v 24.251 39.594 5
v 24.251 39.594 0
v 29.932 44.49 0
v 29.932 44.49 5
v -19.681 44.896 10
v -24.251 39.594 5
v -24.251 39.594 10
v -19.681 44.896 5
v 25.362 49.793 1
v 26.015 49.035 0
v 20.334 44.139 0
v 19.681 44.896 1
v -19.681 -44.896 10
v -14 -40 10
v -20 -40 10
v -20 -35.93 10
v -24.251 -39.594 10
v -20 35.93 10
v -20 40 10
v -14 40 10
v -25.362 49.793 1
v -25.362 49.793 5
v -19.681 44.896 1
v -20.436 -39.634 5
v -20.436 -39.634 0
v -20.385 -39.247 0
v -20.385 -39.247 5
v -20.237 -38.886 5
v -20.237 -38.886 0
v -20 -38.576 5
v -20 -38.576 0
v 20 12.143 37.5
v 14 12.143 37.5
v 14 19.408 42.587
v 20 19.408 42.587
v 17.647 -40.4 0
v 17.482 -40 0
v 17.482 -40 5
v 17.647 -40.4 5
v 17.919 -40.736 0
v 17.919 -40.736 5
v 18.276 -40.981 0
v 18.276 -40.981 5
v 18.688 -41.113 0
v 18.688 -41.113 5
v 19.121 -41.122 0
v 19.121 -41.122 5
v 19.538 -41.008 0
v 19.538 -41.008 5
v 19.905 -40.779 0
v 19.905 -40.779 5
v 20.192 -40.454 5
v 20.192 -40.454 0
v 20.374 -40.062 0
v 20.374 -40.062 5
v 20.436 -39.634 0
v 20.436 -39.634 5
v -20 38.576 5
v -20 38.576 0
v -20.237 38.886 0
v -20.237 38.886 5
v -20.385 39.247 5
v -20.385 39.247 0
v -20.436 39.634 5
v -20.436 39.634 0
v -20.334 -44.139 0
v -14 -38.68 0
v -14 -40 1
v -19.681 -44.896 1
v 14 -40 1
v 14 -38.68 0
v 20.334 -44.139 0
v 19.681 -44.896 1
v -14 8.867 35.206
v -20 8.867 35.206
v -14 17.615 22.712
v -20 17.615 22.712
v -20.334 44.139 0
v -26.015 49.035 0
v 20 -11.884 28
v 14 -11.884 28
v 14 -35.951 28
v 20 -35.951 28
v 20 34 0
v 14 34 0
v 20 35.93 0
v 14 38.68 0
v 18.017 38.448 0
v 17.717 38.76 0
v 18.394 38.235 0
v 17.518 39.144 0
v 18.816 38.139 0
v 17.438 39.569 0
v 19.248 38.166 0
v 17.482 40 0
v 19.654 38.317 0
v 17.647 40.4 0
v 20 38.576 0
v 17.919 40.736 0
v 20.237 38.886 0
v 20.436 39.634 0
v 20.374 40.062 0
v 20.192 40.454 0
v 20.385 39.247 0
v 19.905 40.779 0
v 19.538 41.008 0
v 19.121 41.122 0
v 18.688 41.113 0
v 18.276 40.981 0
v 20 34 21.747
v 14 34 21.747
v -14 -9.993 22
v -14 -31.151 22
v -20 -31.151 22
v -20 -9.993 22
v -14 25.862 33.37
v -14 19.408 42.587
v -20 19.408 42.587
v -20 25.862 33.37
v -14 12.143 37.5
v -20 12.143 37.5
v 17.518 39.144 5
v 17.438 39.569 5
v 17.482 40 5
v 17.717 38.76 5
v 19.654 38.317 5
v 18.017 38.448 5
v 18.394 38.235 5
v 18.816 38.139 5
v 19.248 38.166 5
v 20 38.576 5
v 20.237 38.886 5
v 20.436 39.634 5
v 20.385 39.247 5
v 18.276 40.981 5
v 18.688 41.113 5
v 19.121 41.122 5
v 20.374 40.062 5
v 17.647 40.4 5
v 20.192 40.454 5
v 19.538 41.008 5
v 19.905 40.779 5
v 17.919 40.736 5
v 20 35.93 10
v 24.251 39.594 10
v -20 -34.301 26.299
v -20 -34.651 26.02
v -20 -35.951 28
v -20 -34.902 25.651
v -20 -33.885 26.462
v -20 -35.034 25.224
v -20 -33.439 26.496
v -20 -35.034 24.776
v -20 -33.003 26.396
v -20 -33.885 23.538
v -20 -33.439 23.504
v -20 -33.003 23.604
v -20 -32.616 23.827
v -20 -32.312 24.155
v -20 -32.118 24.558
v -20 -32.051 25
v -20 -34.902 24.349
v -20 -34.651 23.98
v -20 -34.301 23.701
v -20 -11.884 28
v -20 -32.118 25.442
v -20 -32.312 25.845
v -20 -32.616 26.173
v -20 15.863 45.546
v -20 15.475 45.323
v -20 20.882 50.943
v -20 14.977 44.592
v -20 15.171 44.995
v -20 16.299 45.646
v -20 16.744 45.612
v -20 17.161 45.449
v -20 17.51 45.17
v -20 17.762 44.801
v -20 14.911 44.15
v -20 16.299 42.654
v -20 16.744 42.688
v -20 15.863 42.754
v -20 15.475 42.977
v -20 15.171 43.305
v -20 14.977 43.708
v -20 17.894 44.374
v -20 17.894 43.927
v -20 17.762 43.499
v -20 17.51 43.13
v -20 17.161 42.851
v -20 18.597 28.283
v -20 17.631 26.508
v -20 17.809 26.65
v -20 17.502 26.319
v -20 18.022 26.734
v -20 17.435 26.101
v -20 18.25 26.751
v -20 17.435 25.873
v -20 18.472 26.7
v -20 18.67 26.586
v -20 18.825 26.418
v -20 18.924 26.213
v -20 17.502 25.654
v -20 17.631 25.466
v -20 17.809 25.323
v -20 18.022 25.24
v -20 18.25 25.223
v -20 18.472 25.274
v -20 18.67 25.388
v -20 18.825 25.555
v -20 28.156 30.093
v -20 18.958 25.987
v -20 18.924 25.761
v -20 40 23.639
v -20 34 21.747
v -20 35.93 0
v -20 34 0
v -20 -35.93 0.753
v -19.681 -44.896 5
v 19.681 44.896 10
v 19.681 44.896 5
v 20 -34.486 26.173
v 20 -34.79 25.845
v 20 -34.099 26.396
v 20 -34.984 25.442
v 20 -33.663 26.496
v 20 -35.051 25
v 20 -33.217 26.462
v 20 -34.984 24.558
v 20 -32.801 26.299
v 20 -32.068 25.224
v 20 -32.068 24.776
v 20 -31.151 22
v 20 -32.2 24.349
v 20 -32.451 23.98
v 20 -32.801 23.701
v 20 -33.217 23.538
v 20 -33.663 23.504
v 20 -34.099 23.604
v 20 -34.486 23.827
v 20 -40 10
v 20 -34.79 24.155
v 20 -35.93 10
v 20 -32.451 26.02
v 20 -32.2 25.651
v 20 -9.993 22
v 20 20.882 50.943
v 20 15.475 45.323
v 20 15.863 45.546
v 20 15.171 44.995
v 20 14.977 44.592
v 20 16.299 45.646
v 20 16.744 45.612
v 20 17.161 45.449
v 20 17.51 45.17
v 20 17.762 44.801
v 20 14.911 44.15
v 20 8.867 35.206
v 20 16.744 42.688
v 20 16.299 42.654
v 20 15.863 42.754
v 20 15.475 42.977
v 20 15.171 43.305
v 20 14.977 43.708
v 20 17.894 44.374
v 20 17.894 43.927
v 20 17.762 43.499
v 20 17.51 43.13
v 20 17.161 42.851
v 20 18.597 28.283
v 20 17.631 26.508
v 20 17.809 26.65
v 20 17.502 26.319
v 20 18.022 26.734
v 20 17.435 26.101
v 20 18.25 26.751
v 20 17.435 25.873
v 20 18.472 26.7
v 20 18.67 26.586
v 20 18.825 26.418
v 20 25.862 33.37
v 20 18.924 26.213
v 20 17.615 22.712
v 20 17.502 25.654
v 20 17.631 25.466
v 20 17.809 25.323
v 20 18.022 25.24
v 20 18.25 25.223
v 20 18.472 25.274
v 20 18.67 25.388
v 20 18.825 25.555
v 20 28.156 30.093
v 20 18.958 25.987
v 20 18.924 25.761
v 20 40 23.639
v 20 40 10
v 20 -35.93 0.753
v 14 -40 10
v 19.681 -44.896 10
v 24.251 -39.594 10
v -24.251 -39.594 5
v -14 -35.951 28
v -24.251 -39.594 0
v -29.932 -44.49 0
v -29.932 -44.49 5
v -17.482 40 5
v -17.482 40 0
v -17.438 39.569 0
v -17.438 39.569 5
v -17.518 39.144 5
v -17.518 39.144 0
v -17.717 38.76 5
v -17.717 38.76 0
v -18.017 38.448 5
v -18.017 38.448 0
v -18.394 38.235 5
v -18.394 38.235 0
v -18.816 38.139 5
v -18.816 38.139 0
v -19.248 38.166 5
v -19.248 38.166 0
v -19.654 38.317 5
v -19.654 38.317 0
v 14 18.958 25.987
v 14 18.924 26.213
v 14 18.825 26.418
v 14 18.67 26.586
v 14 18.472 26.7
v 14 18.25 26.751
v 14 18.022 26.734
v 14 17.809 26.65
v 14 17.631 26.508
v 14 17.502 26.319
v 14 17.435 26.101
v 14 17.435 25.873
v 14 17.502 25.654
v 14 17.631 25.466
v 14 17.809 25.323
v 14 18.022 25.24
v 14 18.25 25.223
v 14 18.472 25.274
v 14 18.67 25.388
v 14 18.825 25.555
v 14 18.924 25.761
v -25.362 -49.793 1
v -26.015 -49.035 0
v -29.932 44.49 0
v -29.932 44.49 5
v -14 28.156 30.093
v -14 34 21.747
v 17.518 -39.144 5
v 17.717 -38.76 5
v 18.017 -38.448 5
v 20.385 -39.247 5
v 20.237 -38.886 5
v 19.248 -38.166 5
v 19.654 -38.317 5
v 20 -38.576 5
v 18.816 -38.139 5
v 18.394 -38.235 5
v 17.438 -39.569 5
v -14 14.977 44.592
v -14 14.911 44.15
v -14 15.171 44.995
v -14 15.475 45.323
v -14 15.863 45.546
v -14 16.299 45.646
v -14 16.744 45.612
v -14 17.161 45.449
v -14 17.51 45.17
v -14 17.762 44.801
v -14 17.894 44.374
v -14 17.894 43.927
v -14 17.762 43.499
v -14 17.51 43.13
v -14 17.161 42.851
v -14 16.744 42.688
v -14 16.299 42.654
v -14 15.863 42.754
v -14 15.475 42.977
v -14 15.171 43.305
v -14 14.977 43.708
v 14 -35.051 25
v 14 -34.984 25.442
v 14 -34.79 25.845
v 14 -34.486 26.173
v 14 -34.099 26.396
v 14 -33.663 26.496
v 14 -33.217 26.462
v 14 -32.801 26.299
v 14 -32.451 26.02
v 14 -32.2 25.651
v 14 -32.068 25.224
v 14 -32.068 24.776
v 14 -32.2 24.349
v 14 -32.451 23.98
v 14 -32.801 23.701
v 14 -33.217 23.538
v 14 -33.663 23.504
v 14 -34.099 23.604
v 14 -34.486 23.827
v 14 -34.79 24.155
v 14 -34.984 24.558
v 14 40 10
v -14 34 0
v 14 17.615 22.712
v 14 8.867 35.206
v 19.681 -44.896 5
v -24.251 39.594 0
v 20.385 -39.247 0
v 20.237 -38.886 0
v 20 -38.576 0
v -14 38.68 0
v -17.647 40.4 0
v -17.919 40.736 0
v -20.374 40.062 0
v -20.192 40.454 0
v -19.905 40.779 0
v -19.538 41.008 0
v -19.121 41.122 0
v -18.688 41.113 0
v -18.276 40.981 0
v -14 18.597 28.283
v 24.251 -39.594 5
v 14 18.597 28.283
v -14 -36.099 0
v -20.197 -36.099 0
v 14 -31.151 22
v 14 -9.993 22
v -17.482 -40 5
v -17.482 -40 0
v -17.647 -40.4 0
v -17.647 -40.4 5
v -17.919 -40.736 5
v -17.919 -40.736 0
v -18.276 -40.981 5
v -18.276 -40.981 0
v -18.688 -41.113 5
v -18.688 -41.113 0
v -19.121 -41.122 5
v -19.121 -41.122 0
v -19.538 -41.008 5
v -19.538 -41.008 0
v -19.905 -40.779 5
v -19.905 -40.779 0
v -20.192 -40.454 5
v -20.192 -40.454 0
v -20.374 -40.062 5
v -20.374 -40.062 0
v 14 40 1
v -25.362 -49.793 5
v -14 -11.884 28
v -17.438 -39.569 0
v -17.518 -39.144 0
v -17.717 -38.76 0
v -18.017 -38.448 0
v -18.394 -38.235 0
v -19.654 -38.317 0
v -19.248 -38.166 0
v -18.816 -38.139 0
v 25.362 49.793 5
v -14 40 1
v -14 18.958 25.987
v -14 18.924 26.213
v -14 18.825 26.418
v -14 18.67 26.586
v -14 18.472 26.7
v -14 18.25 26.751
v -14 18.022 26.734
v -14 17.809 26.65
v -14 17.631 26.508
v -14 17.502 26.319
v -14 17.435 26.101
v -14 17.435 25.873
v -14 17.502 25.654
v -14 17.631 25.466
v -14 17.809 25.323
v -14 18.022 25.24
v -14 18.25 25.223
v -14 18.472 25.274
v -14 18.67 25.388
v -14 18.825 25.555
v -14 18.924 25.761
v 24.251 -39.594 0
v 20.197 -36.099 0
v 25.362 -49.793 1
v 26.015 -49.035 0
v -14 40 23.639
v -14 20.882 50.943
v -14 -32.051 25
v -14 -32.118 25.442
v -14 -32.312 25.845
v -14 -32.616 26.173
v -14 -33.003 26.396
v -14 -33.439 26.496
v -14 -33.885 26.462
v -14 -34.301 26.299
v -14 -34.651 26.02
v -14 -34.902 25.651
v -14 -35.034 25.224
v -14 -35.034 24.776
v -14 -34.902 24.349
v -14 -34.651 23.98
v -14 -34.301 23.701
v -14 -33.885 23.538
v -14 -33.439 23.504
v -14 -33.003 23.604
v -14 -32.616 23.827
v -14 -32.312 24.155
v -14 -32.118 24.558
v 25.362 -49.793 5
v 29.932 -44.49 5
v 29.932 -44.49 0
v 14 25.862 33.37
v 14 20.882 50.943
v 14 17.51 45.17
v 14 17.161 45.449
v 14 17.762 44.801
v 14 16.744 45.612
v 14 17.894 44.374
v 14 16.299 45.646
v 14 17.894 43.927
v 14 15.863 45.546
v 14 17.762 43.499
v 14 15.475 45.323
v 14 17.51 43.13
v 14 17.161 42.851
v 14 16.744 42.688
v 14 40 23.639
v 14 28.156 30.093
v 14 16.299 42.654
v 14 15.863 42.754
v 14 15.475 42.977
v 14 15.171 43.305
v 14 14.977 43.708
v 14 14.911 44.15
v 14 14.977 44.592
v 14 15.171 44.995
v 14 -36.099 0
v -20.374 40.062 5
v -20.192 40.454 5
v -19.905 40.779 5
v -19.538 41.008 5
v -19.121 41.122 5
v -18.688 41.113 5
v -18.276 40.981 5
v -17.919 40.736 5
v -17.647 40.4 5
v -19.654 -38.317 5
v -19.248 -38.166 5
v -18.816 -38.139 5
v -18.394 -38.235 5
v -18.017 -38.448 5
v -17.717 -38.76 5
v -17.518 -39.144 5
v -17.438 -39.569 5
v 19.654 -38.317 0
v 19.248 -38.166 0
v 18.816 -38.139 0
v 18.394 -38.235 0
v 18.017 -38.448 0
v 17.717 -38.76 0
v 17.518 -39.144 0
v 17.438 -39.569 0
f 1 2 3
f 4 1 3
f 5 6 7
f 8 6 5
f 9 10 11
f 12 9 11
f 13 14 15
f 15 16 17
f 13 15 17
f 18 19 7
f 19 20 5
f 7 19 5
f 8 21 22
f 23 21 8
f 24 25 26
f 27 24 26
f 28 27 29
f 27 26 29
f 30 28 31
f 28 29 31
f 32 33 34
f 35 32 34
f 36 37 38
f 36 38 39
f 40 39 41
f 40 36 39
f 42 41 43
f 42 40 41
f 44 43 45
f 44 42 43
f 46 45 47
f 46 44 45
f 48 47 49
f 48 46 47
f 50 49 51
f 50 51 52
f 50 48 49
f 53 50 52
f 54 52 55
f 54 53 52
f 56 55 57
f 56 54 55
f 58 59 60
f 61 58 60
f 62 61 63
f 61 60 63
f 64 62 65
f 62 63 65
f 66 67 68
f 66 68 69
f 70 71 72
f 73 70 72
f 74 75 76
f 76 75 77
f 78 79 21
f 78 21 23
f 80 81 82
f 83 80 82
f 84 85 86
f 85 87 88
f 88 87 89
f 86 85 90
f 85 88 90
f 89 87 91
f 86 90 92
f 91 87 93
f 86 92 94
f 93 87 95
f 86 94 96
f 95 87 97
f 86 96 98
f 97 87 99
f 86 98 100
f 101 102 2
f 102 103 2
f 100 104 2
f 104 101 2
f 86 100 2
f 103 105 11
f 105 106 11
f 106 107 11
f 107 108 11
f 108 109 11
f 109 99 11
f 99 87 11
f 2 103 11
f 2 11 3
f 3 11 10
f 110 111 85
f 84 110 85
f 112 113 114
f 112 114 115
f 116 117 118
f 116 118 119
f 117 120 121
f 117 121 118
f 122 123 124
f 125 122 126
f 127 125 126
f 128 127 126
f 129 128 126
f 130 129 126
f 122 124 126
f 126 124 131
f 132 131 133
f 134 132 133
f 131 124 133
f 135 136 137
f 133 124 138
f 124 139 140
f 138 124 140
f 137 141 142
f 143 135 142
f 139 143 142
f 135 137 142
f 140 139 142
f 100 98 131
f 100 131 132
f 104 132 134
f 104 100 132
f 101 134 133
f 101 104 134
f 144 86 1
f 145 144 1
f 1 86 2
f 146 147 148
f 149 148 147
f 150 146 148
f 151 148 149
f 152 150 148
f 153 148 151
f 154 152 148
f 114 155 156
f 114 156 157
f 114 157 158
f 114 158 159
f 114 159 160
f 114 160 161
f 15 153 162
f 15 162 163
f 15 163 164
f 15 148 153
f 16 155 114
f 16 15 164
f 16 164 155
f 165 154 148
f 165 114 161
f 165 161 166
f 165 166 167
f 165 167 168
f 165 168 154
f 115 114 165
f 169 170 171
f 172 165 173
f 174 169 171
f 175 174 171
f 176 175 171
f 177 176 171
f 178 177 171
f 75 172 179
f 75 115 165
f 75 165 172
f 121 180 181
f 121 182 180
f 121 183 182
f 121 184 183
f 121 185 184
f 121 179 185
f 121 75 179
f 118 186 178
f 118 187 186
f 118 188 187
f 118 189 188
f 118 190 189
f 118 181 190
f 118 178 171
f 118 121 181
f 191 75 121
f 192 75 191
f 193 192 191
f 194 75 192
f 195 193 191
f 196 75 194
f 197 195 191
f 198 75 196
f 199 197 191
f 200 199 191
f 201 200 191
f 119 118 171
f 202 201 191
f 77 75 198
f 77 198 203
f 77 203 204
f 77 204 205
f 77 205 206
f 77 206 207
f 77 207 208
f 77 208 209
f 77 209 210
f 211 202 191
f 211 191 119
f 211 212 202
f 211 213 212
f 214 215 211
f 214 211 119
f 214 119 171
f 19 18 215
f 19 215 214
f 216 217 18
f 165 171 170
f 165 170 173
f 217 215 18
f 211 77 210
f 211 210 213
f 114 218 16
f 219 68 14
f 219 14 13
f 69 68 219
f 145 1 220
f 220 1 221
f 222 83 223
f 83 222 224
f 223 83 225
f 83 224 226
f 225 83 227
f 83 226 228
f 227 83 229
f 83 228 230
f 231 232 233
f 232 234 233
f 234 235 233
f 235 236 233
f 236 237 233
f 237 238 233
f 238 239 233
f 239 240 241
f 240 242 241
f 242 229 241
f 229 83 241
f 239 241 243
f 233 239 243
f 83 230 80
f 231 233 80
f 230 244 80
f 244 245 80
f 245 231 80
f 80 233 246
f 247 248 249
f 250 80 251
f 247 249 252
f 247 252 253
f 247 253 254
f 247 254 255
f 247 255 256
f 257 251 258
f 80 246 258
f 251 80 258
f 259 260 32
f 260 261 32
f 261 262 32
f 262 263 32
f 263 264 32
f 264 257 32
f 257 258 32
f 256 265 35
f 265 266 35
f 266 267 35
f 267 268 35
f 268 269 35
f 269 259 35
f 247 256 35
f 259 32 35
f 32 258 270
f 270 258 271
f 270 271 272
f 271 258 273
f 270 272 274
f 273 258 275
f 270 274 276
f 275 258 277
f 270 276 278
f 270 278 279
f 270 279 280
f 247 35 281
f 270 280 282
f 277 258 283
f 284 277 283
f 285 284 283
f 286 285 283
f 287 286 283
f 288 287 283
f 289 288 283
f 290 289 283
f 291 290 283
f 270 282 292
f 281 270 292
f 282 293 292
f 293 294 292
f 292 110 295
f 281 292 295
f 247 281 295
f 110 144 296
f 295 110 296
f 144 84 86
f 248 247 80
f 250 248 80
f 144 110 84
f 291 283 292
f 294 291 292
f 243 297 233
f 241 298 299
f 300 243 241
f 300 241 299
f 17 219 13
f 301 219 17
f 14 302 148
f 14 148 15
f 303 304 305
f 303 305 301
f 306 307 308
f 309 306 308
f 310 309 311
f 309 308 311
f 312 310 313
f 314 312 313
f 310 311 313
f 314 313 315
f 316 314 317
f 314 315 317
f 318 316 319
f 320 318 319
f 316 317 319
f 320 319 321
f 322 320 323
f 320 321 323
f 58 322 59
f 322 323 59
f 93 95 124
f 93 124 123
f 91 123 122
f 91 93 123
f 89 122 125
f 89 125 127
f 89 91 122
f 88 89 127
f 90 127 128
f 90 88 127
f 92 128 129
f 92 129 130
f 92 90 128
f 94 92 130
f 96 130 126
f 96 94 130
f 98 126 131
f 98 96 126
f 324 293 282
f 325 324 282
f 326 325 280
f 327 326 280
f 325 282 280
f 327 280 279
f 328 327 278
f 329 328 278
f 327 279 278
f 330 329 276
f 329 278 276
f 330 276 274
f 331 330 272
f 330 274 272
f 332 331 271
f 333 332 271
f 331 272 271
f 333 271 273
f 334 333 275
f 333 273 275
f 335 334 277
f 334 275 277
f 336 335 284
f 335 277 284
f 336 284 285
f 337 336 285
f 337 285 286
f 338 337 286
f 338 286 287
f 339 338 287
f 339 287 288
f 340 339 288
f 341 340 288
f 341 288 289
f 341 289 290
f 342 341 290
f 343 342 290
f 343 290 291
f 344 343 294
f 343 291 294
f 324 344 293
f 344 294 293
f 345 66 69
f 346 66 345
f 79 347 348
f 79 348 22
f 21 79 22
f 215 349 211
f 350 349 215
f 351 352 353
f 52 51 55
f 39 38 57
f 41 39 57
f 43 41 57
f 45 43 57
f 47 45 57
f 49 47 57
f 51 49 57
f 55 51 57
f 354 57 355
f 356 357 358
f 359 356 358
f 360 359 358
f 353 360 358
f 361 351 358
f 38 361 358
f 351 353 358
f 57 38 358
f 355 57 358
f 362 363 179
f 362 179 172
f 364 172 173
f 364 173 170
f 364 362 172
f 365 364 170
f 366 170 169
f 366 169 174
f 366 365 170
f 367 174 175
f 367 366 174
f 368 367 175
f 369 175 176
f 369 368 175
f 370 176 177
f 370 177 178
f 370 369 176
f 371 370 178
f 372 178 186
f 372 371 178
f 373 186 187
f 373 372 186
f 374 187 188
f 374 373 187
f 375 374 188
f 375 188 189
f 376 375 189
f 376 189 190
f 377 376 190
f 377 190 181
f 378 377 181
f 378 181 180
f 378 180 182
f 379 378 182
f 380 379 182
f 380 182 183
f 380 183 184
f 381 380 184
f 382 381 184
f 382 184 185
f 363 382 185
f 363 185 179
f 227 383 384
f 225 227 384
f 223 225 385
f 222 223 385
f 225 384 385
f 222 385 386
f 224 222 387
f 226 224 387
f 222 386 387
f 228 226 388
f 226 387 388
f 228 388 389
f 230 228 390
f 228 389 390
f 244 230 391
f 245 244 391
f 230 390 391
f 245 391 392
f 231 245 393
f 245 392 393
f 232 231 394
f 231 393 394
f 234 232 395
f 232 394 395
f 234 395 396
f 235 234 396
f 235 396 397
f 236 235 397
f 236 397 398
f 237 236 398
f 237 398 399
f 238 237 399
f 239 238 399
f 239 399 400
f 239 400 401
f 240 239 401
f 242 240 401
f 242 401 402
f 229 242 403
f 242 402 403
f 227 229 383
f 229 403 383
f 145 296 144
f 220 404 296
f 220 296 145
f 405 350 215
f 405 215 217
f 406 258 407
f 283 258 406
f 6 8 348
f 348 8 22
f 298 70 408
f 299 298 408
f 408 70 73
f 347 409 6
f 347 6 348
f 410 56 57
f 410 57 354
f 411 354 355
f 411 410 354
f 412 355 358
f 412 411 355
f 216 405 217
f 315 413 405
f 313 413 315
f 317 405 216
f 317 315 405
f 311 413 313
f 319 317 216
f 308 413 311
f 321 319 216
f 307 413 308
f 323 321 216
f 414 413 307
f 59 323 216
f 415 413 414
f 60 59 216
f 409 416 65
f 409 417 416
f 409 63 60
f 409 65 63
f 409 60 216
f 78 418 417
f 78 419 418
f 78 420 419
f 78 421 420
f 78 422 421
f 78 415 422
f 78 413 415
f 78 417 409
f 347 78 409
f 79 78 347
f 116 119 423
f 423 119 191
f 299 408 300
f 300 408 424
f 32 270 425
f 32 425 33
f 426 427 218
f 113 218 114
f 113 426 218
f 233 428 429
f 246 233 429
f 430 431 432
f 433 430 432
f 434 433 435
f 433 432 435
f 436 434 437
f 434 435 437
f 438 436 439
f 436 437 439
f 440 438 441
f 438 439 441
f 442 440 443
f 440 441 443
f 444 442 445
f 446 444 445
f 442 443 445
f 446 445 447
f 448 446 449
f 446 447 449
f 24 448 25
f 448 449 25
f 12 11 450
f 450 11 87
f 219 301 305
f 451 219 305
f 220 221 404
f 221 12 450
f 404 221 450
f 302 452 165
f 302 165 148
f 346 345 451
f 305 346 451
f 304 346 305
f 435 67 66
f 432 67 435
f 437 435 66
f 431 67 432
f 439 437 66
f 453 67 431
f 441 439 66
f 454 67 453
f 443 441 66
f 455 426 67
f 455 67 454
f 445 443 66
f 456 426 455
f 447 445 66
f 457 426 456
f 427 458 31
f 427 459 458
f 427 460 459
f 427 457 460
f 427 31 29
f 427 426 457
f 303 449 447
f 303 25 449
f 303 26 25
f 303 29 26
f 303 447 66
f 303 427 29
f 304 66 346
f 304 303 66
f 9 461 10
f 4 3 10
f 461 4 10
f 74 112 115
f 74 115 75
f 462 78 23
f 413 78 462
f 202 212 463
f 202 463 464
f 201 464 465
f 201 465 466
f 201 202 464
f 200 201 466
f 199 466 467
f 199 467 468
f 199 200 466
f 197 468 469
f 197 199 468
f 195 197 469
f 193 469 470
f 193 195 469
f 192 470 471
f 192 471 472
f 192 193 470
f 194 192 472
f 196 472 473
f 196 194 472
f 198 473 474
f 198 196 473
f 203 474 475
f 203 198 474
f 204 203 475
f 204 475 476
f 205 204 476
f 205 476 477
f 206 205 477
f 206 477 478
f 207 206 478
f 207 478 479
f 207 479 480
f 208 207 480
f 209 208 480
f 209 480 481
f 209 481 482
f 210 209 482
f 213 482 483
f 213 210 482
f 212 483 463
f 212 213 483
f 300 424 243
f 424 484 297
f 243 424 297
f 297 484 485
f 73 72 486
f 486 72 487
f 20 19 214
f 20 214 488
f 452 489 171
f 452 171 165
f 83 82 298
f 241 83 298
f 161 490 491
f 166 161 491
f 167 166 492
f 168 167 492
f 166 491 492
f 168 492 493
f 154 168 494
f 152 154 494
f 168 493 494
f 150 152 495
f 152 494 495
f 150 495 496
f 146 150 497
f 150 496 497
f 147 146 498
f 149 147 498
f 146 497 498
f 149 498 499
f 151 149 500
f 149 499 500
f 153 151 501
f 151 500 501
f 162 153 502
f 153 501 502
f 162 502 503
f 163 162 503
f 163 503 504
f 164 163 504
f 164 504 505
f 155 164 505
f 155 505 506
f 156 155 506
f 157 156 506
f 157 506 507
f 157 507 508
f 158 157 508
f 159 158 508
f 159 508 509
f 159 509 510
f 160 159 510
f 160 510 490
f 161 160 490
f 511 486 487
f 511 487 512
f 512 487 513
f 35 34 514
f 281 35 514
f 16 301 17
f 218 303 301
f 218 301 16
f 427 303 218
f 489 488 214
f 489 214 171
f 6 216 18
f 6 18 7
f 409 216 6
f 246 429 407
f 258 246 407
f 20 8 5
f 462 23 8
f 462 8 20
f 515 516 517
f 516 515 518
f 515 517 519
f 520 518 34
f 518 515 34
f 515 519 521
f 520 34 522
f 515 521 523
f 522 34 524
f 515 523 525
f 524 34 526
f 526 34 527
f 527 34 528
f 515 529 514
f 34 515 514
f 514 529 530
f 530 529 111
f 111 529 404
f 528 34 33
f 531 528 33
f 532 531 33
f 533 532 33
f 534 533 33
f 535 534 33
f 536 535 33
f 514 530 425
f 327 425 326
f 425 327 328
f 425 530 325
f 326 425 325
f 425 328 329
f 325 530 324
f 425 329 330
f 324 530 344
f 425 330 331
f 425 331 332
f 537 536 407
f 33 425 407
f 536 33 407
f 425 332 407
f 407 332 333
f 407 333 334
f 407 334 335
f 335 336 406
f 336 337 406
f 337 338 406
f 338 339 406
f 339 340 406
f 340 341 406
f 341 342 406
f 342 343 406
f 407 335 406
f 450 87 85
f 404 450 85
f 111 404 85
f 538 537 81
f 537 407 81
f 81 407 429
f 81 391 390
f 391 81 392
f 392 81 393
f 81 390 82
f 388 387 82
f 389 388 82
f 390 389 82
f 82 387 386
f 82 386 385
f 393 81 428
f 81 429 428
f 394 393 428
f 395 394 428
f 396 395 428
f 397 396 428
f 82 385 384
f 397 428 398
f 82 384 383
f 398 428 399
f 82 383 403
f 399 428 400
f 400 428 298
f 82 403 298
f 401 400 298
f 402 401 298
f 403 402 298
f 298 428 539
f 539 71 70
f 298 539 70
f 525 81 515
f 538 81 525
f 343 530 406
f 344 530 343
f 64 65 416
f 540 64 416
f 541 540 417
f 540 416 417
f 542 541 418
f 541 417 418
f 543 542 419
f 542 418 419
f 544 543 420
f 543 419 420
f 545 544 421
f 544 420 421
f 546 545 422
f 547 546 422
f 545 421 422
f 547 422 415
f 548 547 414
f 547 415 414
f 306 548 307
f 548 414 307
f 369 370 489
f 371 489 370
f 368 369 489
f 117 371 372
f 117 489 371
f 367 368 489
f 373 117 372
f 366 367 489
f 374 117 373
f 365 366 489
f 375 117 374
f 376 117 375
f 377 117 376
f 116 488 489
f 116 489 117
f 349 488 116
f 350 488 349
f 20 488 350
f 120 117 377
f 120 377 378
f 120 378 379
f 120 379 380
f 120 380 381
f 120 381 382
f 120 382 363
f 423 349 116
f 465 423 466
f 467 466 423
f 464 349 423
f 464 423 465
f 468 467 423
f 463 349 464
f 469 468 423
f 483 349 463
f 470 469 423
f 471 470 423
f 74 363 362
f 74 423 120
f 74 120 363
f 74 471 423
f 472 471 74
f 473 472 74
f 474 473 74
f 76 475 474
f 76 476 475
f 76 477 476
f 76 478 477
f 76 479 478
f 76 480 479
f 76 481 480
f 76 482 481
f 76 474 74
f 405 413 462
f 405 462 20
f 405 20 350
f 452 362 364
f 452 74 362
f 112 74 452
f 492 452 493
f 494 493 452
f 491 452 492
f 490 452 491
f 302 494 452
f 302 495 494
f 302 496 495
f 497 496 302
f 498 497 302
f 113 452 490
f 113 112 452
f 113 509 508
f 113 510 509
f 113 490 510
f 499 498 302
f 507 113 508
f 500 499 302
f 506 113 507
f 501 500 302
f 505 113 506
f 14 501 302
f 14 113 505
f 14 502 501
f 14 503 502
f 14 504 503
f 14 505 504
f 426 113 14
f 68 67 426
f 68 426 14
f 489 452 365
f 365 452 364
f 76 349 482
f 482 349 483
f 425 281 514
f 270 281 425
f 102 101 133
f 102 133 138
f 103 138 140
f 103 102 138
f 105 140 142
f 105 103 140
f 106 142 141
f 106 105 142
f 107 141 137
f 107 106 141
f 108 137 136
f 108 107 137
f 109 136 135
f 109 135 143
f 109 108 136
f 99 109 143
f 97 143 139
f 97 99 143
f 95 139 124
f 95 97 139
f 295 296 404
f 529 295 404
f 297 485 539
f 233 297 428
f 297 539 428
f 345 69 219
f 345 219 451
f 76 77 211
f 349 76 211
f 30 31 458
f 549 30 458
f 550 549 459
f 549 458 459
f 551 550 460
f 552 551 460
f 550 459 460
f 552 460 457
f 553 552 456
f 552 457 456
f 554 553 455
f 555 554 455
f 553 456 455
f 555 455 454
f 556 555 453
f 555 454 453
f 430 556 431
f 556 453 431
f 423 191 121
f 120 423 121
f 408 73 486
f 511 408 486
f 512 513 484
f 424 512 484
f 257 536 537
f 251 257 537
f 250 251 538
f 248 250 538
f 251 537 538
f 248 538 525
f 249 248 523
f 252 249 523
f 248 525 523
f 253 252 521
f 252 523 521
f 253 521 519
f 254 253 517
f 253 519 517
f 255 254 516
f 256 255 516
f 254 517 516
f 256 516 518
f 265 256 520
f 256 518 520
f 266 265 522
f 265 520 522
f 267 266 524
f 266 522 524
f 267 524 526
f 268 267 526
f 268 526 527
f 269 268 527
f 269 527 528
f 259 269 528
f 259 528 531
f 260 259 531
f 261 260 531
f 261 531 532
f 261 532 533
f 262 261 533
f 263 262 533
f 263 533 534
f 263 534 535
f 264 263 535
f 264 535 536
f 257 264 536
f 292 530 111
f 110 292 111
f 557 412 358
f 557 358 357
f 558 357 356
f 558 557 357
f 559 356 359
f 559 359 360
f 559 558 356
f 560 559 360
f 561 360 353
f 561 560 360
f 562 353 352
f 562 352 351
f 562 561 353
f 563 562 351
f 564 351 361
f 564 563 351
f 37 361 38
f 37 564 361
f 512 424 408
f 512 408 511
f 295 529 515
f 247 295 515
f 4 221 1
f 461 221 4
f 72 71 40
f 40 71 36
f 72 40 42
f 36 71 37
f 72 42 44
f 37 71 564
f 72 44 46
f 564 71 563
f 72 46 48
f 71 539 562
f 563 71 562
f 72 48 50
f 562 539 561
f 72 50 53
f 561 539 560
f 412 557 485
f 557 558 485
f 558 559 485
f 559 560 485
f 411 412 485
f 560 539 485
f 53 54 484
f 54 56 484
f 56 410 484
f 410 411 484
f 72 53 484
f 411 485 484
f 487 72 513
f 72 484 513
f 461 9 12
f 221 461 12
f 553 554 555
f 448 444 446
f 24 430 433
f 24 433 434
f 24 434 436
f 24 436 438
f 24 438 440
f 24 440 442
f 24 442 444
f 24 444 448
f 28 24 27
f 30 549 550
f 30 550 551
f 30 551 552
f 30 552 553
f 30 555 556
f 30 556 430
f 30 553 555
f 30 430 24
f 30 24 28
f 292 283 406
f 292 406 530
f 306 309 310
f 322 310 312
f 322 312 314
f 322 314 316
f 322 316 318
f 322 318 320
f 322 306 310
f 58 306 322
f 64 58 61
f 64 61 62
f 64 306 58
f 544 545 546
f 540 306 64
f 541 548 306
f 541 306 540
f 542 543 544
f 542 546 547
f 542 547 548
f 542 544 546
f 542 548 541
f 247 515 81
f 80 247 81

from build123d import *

# Parameters (mm, degrees)
F1_DEPTH   = 70
F2_DEPTH   = 10
F3_DEPTH   = 5
F5_DEPTH   = 25
F6_DEPTH   = 5
F8_R       = 0.7661349595
F9_DEPTH   = 6
F7_R       = 1.5
F10_DEPTH  = 7
F13_DEPTH  = 6
F14_R      = 1.5
F15_DEPTH  = 12
F16_SIZE   = 1
F16_2_SIZE = 1


with BuildPart() as f1:
    # F0 (on Top) → F1 (new body)
    with BuildSketch(Plane.XY):
        with BuildLine():
            Line((17.481584177, 40), (14, 40))
            Line((14, 40), (18.5698965916, 34.6975434805))
            Line((18.5698965916, 34.6975434805), (20, 35.9300712093))
            Line((20, 35.9300712093), (20, 38.5762325992))
            ThreePointArc((20, 38.5762325992), (18.1979669018, 38.327945742), (17.481584177, 40))
        make_face()
        with BuildLine():
            Line((20, 40), (17.481584177, 40))
            ThreePointArc((17.481584177, 40), (18.1979669018, 38.327945742), (20, 38.5762325992))
            Line((20, 38.5762325992), (20, 40))
        make_face()
        Polygon((18.5698965916, 34.6975434805), (14, 40), (14, 0), (14, -40), (18.5698965916, -34.6975434805), (20, -35.9300712093), (20, 0), (20, 35.9300712093), align=None)
        with BuildLine():
            Line((18.5698965916, -34.6975434805), (14, -40))
            Line((14, -40), (17.481584177, -40))
            ThreePointArc((17.481584177, -40), (18.1979669018, -38.327945742), (20, -38.5762325992))
            Line((20, -38.5762325992), (20, -35.9300712093))
            Line((20, -35.9300712093), (18.5698965916, -34.6975434805))
        make_face()
        with BuildLine():
            ThreePointArc((20, -38.5762325992), (18.1979669018, -38.327945742), (17.481584177, -40))
            Line((17.481584177, -40), (20, -40))
            Line((20, -40), (20, -38.5762325992))
        make_face()
    extrude(amount=F1_DEPTH)

    # F0 (on Top) → F2 (join)
    with BuildSketch(Plane.XY):
        with BuildLine():
            ThreePointArc((20.4361765556, 39.633720036), (19.1207184642, 41.1223248473), (17.481584177, 40))
            Line((17.481584177, 40), (20, 40))
            Line((20, 40), (20, 38.5762325992))
            ThreePointArc((20, 38.5762325992), (20.3228515656, 39.0617651281), (20.4361765556, 39.633720036))
        make_face()
        with BuildLine():
            Line((19.6812034138, 44.8963177768), (14, 40))
            Line((14, 40), (17.481584177, 40))
            ThreePointArc((17.481584177, 40), (19.1207184642, 41.1223248473), (20.4361765556, 39.633720036))
            ThreePointArc((20.4361765556, 39.633720036), (20.3228515656, 39.0617651281), (20, 38.5762325992))
            Line((20, 38.5762325992), (20, 35.9300712093))
            Line((20, 35.9300712093), (24.2511000054, 39.5938612572))
            Line((24.2511000054, 39.5938612572), (19.6812034138, 44.8963177768))
        make_face()
        with BuildLine():
            Line((17.481584177, -40), (14, -40))
            Line((14, -40), (19.6812034138, -44.8963177768))
            Line((19.6812034138, -44.8963177768), (24.2511000054, -39.5938612572))
            Line((24.2511000054, -39.5938612572), (20, -35.9300712093))
            Line((20, -35.9300712093), (20, -38.5762325992))
            ThreePointArc((20, -38.5762325992), (20.3228515656, -39.0617651281), (20.4361765556, -39.633720036))
            ThreePointArc((20.4361765556, -39.633720036), (19.1207184642, -41.1223248473), (17.481584177, -40))
        make_face()
        with BuildLine():
            Line((20, -40), (17.481584177, -40))
            ThreePointArc((17.481584177, -40), (19.1207184642, -41.1223248473), (20.4361765556, -39.633720036))
            ThreePointArc((20.4361765556, -39.633720036), (20.3228515656, -39.0617651281), (20, -38.5762325992))
            Line((20, -38.5762325992), (20, -40))
        make_face()
    extrude(amount=F2_DEPTH)

    # F0 (on Top) → F3 (join)
    with BuildSketch(Plane.XY):
        Polygon((25.3624068276, 49.7926355535), (19.6812034138, 44.8963177768), (24.2511000054, 39.5938612572), (29.9323034192, 44.490179034), align=None)
        Polygon((24.2511000054, -39.5938612572), (19.6812034138, -44.8963177768), (25.3624068276, -49.7926355535), (29.9323034192, -44.490179034), align=None)
    extrude(amount=F3_DEPTH)

    # F4 (on face) → F5 (cut)
    with BuildSketch(Plane(origin=(14, 0, 0), x_dir=(0, -1, 0), z_dir=(-1, 0, 0))):
        Polygon((-34, 0), (36.0994255375, 0), (31.1508810268, 22), (9.992649815, 22), (-19.4081855757, 42.5866865702), (-34, 21.7474158853), align=None)
        Polygon((-20.8816392233, 50.943057454), (11.8844425483, 28), (35.9511908549, 28), (40, 10), (40, 70), (-40, 70), (-40, 23.6392086186), align=None)
    extrude(amount=-F5_DEPTH, mode=Mode.SUBTRACT)

    # F0 (on Top) → F6 (cut)
    with BuildSketch(Plane.XY):
        with BuildLine():
            Line((20, -40), (17.481584177, -40))
            ThreePointArc((17.481584177, -40), (19.1207184642, -41.1223248473), (20.4361765556, -39.633720036))
            ThreePointArc((20.4361765556, -39.633720036), (20.3228515656, -39.0617651281), (20, -38.5762325992))
            Line((20, -38.5762325992), (20, -40))
        make_face()
        with BuildLine():
            ThreePointArc((20, -38.5762325992), (18.1979669018, -38.327945742), (17.481584177, -40))
            Line((17.481584177, -40), (20, -40))
            Line((20, -40), (20, -38.5762325992))
        make_face()
        with BuildLine():
            ThreePointArc((20.4361765556, 39.633720036), (19.1207184642, 41.1223248473), (17.481584177, 40))
            Line((17.481584177, 40), (20, 40))
            Line((20, 40), (20, 38.5762325992))
            ThreePointArc((20, 38.5762325992), (20.3228515656, 39.0617651281), (20.4361765556, 39.633720036))
        make_face()
        with BuildLine():
            Line((20, 40), (17.481584177, 40))
            ThreePointArc((17.481584177, 40), (18.1979669018, 38.327945742), (20, 38.5762325992))
            Line((20, 38.5762325992), (20, 40))
        make_face()
    extrude(amount=F6_DEPTH, mode=Mode.SUBTRACT)

    # F7 (on face) → F10 (cut)
    with BuildSketch(Plane(origin=(14, 0, 0), x_dir=(0, -1, 0), z_dir=(-1, 0, 0))):
        with Locations((-16.4106077752, 44.1500837642)):
            Circle(F7_R)
    extrude(amount=-F10_DEPTH, mode=Mode.SUBTRACT)


with BuildPart() as f9:
    # F8 (on face) → F9 (new body)
    with BuildSketch(Plane.YZ.offset(20)):
        Polygon((12.143454066, 37.499866804), (8.8668458888, 35.2055610586), (17.6148869053, 22.7120637181), (28.1562265921, 30.0931892296), (25.8619208467, 33.3697974068), (18.597189337, 28.2829776406), align=None)
        with Locations((18.1923007229, 25.9867402042)):
            Circle(F8_R, mode=Mode.SUBTRACT)
    extrude(amount=-F9_DEPTH)

    # F11: union F1
    add(f1.part)


with BuildPart() as f12_1:
    # F12: instance of F9
    add(f9.part.mirror(Plane.YZ))

    # F14 (on face) → F15 (cut)
    with BuildSketch(Plane.YZ.offset(-14)):
        with Locations((-33.5510359408, 25)):
            Circle(F14_R)
    extrude(amount=-F15_DEPTH, mode=Mode.SUBTRACT)

    # F16
    f16_edges = [f12_1.edges().sort_by_distance(p)[0] for p in [
        (-19.681203, -44.896318, 0),
        (-19.681203, 44.896318, 0),
    ]]
    chamfer(f16_edges, length=F16_SIZE)


with BuildPart() as f9_1:
    add(f9.part)

    # F7 (on face) → F13 (cut, symmetric)
    with BuildSketch(Plane(origin=(14, 0, 0), x_dir=(0, -1, 0), z_dir=(-1, 0, 0))):
        with Locations((33.5510359408, 25)):
            Circle(F7_R)
    extrude(amount=F13_DEPTH, both=True, mode=Mode.SUBTRACT)

    # F16#2
    f16_2_edges = [f9_1.edges().sort_by_distance(p)[0] for p in [
        (19.681203, -44.896318, 0),
        (19.681203, 44.896318, 0),
    ]]
    chamfer(f16_2_edges, length=F16_2_SIZE)


solid = Compound([f12_1.part, f9_1.part])
